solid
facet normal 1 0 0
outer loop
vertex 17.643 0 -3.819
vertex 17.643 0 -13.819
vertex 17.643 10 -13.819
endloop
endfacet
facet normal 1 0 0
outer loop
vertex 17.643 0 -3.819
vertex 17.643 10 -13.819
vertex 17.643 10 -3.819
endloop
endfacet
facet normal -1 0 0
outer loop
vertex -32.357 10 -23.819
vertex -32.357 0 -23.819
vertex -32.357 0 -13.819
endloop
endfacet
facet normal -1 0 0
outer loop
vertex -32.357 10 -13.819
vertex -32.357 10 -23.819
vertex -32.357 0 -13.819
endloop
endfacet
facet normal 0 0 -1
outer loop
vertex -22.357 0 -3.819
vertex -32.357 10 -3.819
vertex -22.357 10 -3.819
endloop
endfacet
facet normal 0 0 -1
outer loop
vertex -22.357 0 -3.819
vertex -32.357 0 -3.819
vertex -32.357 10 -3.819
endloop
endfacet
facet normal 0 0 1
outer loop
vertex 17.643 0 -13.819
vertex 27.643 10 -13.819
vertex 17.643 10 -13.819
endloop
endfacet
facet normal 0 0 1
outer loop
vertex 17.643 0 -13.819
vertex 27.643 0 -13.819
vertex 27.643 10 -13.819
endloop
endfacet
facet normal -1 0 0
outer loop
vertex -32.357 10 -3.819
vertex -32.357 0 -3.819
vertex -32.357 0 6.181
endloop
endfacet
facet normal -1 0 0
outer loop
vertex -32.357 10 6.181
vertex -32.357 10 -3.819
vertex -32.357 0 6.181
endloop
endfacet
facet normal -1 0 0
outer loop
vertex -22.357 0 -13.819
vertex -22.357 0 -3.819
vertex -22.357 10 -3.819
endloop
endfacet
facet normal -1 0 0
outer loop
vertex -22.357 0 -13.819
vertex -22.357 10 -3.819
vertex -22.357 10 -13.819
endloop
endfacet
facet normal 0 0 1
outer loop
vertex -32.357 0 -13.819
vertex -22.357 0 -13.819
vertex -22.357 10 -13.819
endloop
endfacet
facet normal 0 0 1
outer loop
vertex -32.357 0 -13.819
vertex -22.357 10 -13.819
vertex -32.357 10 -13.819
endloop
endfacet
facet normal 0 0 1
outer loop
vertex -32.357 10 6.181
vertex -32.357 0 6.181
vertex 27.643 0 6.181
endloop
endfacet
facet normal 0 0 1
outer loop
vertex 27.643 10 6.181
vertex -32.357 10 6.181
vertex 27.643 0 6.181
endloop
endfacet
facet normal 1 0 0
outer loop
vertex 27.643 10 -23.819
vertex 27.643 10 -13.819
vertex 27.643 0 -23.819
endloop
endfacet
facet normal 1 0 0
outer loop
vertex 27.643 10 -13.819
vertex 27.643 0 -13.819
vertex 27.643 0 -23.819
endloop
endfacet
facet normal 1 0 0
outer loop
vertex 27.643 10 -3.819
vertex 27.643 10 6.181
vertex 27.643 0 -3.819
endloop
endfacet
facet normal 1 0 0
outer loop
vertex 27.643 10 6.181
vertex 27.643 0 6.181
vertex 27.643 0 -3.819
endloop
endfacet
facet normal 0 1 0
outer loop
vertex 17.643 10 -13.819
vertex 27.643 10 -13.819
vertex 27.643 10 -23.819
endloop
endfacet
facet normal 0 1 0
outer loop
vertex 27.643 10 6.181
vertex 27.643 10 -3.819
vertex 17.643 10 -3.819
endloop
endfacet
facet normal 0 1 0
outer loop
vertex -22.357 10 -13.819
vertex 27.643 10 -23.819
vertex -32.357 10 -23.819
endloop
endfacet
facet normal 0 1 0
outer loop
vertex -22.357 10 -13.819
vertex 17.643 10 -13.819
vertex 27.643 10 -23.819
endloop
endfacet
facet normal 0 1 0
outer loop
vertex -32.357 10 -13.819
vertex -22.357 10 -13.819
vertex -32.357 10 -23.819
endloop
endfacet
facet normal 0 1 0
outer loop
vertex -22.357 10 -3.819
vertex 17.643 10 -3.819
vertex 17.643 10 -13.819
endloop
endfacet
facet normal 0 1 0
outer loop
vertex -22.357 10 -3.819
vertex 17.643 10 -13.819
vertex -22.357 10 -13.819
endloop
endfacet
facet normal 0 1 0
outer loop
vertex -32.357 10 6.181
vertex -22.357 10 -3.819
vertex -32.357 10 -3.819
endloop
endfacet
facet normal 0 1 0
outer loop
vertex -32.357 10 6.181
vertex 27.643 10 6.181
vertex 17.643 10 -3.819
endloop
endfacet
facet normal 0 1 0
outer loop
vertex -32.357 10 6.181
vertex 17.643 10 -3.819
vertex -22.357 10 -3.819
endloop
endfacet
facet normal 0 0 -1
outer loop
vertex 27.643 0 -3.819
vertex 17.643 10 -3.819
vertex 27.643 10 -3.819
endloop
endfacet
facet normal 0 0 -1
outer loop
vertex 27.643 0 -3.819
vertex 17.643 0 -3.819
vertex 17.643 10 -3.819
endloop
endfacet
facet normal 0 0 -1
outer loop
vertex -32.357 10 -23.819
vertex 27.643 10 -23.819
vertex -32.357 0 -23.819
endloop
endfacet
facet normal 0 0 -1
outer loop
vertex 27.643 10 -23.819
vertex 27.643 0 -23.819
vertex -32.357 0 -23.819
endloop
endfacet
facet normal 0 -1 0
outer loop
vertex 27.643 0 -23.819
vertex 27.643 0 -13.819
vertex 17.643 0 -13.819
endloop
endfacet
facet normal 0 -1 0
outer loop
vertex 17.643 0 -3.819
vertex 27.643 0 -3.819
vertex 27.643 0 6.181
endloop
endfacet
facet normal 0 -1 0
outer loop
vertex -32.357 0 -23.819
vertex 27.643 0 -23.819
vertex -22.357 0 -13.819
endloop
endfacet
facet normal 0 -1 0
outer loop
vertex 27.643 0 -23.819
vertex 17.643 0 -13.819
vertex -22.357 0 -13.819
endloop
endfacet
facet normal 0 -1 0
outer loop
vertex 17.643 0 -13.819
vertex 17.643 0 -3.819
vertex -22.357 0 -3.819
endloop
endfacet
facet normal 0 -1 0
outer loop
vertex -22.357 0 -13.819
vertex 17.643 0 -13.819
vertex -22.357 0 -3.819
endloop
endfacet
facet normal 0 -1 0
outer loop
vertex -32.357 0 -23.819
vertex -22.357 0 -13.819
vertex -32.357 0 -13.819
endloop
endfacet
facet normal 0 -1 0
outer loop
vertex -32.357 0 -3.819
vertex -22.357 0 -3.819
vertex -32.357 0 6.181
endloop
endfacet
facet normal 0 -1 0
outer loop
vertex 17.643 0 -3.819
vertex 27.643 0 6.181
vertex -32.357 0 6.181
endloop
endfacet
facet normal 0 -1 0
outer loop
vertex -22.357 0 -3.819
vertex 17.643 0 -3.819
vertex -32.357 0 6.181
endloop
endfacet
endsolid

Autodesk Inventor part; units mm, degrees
ref_plane "YZ Plane" through (0, 0, 0) normal (1, 0, 0) x (0, 1, 0)
ref_plane "XZ Plane" through (0, 0, 0) normal (0, 1, 0) x (-1, 0, 0)
ref_plane "XY Plane" through (0, 0, 0) normal (0, 0, 1) x (1, 0, 0)
sketch "Skizze1" plane through (0, 0, 0) normal (0, 1, 0) x (-1, 0, 0)
  line L0 (32.3571, 6.1813) -> (-27.6429, 6.1813)
  line L1 (-27.6429, -23.8187) -> (32.3571, -23.8187)
  line L2 (32.3571, -3.8187) -> (22.3571, -3.8187)
  line L3 (22.3571, -3.8187) -> (22.3571, -13.8187)
  line L4 (22.3571, -13.8187) -> (32.3571, -13.8187)
  line L5 (-17.6429, -3.8187) -> (-27.6429, -3.8187)
  line L6 (-27.6429, -13.8187) -> (-17.6429, -13.8187)
  line L7 (-17.6429, -13.8187) -> (-17.6429, -3.8187)
  line L8 (-27.6429, 6.1813) -> (-27.6429, -3.8187)
  line L9 (-27.6429, -13.8187) -> (-27.6429, -23.8187)
  line L10 (32.3571, -23.8187) -> (32.3571, -13.8187)
  line L11 (32.3571, -3.8187) -> (32.3571, 6.1813)
  point P0 (0, 0)
  dimension "d0" = 30
  dimension "d1" = 60
  dimension "d2" = 10
  dimension "d3" = 10
  dimension "d4" = 10
  dimension "d6" = 10
  dimension "d7" = 10
  dimension "d10" = 10
extrude "Extrusion1" add sketch "Skizze1" along normal blind 10
properties part number "KabelBoxPlatteKurz"
